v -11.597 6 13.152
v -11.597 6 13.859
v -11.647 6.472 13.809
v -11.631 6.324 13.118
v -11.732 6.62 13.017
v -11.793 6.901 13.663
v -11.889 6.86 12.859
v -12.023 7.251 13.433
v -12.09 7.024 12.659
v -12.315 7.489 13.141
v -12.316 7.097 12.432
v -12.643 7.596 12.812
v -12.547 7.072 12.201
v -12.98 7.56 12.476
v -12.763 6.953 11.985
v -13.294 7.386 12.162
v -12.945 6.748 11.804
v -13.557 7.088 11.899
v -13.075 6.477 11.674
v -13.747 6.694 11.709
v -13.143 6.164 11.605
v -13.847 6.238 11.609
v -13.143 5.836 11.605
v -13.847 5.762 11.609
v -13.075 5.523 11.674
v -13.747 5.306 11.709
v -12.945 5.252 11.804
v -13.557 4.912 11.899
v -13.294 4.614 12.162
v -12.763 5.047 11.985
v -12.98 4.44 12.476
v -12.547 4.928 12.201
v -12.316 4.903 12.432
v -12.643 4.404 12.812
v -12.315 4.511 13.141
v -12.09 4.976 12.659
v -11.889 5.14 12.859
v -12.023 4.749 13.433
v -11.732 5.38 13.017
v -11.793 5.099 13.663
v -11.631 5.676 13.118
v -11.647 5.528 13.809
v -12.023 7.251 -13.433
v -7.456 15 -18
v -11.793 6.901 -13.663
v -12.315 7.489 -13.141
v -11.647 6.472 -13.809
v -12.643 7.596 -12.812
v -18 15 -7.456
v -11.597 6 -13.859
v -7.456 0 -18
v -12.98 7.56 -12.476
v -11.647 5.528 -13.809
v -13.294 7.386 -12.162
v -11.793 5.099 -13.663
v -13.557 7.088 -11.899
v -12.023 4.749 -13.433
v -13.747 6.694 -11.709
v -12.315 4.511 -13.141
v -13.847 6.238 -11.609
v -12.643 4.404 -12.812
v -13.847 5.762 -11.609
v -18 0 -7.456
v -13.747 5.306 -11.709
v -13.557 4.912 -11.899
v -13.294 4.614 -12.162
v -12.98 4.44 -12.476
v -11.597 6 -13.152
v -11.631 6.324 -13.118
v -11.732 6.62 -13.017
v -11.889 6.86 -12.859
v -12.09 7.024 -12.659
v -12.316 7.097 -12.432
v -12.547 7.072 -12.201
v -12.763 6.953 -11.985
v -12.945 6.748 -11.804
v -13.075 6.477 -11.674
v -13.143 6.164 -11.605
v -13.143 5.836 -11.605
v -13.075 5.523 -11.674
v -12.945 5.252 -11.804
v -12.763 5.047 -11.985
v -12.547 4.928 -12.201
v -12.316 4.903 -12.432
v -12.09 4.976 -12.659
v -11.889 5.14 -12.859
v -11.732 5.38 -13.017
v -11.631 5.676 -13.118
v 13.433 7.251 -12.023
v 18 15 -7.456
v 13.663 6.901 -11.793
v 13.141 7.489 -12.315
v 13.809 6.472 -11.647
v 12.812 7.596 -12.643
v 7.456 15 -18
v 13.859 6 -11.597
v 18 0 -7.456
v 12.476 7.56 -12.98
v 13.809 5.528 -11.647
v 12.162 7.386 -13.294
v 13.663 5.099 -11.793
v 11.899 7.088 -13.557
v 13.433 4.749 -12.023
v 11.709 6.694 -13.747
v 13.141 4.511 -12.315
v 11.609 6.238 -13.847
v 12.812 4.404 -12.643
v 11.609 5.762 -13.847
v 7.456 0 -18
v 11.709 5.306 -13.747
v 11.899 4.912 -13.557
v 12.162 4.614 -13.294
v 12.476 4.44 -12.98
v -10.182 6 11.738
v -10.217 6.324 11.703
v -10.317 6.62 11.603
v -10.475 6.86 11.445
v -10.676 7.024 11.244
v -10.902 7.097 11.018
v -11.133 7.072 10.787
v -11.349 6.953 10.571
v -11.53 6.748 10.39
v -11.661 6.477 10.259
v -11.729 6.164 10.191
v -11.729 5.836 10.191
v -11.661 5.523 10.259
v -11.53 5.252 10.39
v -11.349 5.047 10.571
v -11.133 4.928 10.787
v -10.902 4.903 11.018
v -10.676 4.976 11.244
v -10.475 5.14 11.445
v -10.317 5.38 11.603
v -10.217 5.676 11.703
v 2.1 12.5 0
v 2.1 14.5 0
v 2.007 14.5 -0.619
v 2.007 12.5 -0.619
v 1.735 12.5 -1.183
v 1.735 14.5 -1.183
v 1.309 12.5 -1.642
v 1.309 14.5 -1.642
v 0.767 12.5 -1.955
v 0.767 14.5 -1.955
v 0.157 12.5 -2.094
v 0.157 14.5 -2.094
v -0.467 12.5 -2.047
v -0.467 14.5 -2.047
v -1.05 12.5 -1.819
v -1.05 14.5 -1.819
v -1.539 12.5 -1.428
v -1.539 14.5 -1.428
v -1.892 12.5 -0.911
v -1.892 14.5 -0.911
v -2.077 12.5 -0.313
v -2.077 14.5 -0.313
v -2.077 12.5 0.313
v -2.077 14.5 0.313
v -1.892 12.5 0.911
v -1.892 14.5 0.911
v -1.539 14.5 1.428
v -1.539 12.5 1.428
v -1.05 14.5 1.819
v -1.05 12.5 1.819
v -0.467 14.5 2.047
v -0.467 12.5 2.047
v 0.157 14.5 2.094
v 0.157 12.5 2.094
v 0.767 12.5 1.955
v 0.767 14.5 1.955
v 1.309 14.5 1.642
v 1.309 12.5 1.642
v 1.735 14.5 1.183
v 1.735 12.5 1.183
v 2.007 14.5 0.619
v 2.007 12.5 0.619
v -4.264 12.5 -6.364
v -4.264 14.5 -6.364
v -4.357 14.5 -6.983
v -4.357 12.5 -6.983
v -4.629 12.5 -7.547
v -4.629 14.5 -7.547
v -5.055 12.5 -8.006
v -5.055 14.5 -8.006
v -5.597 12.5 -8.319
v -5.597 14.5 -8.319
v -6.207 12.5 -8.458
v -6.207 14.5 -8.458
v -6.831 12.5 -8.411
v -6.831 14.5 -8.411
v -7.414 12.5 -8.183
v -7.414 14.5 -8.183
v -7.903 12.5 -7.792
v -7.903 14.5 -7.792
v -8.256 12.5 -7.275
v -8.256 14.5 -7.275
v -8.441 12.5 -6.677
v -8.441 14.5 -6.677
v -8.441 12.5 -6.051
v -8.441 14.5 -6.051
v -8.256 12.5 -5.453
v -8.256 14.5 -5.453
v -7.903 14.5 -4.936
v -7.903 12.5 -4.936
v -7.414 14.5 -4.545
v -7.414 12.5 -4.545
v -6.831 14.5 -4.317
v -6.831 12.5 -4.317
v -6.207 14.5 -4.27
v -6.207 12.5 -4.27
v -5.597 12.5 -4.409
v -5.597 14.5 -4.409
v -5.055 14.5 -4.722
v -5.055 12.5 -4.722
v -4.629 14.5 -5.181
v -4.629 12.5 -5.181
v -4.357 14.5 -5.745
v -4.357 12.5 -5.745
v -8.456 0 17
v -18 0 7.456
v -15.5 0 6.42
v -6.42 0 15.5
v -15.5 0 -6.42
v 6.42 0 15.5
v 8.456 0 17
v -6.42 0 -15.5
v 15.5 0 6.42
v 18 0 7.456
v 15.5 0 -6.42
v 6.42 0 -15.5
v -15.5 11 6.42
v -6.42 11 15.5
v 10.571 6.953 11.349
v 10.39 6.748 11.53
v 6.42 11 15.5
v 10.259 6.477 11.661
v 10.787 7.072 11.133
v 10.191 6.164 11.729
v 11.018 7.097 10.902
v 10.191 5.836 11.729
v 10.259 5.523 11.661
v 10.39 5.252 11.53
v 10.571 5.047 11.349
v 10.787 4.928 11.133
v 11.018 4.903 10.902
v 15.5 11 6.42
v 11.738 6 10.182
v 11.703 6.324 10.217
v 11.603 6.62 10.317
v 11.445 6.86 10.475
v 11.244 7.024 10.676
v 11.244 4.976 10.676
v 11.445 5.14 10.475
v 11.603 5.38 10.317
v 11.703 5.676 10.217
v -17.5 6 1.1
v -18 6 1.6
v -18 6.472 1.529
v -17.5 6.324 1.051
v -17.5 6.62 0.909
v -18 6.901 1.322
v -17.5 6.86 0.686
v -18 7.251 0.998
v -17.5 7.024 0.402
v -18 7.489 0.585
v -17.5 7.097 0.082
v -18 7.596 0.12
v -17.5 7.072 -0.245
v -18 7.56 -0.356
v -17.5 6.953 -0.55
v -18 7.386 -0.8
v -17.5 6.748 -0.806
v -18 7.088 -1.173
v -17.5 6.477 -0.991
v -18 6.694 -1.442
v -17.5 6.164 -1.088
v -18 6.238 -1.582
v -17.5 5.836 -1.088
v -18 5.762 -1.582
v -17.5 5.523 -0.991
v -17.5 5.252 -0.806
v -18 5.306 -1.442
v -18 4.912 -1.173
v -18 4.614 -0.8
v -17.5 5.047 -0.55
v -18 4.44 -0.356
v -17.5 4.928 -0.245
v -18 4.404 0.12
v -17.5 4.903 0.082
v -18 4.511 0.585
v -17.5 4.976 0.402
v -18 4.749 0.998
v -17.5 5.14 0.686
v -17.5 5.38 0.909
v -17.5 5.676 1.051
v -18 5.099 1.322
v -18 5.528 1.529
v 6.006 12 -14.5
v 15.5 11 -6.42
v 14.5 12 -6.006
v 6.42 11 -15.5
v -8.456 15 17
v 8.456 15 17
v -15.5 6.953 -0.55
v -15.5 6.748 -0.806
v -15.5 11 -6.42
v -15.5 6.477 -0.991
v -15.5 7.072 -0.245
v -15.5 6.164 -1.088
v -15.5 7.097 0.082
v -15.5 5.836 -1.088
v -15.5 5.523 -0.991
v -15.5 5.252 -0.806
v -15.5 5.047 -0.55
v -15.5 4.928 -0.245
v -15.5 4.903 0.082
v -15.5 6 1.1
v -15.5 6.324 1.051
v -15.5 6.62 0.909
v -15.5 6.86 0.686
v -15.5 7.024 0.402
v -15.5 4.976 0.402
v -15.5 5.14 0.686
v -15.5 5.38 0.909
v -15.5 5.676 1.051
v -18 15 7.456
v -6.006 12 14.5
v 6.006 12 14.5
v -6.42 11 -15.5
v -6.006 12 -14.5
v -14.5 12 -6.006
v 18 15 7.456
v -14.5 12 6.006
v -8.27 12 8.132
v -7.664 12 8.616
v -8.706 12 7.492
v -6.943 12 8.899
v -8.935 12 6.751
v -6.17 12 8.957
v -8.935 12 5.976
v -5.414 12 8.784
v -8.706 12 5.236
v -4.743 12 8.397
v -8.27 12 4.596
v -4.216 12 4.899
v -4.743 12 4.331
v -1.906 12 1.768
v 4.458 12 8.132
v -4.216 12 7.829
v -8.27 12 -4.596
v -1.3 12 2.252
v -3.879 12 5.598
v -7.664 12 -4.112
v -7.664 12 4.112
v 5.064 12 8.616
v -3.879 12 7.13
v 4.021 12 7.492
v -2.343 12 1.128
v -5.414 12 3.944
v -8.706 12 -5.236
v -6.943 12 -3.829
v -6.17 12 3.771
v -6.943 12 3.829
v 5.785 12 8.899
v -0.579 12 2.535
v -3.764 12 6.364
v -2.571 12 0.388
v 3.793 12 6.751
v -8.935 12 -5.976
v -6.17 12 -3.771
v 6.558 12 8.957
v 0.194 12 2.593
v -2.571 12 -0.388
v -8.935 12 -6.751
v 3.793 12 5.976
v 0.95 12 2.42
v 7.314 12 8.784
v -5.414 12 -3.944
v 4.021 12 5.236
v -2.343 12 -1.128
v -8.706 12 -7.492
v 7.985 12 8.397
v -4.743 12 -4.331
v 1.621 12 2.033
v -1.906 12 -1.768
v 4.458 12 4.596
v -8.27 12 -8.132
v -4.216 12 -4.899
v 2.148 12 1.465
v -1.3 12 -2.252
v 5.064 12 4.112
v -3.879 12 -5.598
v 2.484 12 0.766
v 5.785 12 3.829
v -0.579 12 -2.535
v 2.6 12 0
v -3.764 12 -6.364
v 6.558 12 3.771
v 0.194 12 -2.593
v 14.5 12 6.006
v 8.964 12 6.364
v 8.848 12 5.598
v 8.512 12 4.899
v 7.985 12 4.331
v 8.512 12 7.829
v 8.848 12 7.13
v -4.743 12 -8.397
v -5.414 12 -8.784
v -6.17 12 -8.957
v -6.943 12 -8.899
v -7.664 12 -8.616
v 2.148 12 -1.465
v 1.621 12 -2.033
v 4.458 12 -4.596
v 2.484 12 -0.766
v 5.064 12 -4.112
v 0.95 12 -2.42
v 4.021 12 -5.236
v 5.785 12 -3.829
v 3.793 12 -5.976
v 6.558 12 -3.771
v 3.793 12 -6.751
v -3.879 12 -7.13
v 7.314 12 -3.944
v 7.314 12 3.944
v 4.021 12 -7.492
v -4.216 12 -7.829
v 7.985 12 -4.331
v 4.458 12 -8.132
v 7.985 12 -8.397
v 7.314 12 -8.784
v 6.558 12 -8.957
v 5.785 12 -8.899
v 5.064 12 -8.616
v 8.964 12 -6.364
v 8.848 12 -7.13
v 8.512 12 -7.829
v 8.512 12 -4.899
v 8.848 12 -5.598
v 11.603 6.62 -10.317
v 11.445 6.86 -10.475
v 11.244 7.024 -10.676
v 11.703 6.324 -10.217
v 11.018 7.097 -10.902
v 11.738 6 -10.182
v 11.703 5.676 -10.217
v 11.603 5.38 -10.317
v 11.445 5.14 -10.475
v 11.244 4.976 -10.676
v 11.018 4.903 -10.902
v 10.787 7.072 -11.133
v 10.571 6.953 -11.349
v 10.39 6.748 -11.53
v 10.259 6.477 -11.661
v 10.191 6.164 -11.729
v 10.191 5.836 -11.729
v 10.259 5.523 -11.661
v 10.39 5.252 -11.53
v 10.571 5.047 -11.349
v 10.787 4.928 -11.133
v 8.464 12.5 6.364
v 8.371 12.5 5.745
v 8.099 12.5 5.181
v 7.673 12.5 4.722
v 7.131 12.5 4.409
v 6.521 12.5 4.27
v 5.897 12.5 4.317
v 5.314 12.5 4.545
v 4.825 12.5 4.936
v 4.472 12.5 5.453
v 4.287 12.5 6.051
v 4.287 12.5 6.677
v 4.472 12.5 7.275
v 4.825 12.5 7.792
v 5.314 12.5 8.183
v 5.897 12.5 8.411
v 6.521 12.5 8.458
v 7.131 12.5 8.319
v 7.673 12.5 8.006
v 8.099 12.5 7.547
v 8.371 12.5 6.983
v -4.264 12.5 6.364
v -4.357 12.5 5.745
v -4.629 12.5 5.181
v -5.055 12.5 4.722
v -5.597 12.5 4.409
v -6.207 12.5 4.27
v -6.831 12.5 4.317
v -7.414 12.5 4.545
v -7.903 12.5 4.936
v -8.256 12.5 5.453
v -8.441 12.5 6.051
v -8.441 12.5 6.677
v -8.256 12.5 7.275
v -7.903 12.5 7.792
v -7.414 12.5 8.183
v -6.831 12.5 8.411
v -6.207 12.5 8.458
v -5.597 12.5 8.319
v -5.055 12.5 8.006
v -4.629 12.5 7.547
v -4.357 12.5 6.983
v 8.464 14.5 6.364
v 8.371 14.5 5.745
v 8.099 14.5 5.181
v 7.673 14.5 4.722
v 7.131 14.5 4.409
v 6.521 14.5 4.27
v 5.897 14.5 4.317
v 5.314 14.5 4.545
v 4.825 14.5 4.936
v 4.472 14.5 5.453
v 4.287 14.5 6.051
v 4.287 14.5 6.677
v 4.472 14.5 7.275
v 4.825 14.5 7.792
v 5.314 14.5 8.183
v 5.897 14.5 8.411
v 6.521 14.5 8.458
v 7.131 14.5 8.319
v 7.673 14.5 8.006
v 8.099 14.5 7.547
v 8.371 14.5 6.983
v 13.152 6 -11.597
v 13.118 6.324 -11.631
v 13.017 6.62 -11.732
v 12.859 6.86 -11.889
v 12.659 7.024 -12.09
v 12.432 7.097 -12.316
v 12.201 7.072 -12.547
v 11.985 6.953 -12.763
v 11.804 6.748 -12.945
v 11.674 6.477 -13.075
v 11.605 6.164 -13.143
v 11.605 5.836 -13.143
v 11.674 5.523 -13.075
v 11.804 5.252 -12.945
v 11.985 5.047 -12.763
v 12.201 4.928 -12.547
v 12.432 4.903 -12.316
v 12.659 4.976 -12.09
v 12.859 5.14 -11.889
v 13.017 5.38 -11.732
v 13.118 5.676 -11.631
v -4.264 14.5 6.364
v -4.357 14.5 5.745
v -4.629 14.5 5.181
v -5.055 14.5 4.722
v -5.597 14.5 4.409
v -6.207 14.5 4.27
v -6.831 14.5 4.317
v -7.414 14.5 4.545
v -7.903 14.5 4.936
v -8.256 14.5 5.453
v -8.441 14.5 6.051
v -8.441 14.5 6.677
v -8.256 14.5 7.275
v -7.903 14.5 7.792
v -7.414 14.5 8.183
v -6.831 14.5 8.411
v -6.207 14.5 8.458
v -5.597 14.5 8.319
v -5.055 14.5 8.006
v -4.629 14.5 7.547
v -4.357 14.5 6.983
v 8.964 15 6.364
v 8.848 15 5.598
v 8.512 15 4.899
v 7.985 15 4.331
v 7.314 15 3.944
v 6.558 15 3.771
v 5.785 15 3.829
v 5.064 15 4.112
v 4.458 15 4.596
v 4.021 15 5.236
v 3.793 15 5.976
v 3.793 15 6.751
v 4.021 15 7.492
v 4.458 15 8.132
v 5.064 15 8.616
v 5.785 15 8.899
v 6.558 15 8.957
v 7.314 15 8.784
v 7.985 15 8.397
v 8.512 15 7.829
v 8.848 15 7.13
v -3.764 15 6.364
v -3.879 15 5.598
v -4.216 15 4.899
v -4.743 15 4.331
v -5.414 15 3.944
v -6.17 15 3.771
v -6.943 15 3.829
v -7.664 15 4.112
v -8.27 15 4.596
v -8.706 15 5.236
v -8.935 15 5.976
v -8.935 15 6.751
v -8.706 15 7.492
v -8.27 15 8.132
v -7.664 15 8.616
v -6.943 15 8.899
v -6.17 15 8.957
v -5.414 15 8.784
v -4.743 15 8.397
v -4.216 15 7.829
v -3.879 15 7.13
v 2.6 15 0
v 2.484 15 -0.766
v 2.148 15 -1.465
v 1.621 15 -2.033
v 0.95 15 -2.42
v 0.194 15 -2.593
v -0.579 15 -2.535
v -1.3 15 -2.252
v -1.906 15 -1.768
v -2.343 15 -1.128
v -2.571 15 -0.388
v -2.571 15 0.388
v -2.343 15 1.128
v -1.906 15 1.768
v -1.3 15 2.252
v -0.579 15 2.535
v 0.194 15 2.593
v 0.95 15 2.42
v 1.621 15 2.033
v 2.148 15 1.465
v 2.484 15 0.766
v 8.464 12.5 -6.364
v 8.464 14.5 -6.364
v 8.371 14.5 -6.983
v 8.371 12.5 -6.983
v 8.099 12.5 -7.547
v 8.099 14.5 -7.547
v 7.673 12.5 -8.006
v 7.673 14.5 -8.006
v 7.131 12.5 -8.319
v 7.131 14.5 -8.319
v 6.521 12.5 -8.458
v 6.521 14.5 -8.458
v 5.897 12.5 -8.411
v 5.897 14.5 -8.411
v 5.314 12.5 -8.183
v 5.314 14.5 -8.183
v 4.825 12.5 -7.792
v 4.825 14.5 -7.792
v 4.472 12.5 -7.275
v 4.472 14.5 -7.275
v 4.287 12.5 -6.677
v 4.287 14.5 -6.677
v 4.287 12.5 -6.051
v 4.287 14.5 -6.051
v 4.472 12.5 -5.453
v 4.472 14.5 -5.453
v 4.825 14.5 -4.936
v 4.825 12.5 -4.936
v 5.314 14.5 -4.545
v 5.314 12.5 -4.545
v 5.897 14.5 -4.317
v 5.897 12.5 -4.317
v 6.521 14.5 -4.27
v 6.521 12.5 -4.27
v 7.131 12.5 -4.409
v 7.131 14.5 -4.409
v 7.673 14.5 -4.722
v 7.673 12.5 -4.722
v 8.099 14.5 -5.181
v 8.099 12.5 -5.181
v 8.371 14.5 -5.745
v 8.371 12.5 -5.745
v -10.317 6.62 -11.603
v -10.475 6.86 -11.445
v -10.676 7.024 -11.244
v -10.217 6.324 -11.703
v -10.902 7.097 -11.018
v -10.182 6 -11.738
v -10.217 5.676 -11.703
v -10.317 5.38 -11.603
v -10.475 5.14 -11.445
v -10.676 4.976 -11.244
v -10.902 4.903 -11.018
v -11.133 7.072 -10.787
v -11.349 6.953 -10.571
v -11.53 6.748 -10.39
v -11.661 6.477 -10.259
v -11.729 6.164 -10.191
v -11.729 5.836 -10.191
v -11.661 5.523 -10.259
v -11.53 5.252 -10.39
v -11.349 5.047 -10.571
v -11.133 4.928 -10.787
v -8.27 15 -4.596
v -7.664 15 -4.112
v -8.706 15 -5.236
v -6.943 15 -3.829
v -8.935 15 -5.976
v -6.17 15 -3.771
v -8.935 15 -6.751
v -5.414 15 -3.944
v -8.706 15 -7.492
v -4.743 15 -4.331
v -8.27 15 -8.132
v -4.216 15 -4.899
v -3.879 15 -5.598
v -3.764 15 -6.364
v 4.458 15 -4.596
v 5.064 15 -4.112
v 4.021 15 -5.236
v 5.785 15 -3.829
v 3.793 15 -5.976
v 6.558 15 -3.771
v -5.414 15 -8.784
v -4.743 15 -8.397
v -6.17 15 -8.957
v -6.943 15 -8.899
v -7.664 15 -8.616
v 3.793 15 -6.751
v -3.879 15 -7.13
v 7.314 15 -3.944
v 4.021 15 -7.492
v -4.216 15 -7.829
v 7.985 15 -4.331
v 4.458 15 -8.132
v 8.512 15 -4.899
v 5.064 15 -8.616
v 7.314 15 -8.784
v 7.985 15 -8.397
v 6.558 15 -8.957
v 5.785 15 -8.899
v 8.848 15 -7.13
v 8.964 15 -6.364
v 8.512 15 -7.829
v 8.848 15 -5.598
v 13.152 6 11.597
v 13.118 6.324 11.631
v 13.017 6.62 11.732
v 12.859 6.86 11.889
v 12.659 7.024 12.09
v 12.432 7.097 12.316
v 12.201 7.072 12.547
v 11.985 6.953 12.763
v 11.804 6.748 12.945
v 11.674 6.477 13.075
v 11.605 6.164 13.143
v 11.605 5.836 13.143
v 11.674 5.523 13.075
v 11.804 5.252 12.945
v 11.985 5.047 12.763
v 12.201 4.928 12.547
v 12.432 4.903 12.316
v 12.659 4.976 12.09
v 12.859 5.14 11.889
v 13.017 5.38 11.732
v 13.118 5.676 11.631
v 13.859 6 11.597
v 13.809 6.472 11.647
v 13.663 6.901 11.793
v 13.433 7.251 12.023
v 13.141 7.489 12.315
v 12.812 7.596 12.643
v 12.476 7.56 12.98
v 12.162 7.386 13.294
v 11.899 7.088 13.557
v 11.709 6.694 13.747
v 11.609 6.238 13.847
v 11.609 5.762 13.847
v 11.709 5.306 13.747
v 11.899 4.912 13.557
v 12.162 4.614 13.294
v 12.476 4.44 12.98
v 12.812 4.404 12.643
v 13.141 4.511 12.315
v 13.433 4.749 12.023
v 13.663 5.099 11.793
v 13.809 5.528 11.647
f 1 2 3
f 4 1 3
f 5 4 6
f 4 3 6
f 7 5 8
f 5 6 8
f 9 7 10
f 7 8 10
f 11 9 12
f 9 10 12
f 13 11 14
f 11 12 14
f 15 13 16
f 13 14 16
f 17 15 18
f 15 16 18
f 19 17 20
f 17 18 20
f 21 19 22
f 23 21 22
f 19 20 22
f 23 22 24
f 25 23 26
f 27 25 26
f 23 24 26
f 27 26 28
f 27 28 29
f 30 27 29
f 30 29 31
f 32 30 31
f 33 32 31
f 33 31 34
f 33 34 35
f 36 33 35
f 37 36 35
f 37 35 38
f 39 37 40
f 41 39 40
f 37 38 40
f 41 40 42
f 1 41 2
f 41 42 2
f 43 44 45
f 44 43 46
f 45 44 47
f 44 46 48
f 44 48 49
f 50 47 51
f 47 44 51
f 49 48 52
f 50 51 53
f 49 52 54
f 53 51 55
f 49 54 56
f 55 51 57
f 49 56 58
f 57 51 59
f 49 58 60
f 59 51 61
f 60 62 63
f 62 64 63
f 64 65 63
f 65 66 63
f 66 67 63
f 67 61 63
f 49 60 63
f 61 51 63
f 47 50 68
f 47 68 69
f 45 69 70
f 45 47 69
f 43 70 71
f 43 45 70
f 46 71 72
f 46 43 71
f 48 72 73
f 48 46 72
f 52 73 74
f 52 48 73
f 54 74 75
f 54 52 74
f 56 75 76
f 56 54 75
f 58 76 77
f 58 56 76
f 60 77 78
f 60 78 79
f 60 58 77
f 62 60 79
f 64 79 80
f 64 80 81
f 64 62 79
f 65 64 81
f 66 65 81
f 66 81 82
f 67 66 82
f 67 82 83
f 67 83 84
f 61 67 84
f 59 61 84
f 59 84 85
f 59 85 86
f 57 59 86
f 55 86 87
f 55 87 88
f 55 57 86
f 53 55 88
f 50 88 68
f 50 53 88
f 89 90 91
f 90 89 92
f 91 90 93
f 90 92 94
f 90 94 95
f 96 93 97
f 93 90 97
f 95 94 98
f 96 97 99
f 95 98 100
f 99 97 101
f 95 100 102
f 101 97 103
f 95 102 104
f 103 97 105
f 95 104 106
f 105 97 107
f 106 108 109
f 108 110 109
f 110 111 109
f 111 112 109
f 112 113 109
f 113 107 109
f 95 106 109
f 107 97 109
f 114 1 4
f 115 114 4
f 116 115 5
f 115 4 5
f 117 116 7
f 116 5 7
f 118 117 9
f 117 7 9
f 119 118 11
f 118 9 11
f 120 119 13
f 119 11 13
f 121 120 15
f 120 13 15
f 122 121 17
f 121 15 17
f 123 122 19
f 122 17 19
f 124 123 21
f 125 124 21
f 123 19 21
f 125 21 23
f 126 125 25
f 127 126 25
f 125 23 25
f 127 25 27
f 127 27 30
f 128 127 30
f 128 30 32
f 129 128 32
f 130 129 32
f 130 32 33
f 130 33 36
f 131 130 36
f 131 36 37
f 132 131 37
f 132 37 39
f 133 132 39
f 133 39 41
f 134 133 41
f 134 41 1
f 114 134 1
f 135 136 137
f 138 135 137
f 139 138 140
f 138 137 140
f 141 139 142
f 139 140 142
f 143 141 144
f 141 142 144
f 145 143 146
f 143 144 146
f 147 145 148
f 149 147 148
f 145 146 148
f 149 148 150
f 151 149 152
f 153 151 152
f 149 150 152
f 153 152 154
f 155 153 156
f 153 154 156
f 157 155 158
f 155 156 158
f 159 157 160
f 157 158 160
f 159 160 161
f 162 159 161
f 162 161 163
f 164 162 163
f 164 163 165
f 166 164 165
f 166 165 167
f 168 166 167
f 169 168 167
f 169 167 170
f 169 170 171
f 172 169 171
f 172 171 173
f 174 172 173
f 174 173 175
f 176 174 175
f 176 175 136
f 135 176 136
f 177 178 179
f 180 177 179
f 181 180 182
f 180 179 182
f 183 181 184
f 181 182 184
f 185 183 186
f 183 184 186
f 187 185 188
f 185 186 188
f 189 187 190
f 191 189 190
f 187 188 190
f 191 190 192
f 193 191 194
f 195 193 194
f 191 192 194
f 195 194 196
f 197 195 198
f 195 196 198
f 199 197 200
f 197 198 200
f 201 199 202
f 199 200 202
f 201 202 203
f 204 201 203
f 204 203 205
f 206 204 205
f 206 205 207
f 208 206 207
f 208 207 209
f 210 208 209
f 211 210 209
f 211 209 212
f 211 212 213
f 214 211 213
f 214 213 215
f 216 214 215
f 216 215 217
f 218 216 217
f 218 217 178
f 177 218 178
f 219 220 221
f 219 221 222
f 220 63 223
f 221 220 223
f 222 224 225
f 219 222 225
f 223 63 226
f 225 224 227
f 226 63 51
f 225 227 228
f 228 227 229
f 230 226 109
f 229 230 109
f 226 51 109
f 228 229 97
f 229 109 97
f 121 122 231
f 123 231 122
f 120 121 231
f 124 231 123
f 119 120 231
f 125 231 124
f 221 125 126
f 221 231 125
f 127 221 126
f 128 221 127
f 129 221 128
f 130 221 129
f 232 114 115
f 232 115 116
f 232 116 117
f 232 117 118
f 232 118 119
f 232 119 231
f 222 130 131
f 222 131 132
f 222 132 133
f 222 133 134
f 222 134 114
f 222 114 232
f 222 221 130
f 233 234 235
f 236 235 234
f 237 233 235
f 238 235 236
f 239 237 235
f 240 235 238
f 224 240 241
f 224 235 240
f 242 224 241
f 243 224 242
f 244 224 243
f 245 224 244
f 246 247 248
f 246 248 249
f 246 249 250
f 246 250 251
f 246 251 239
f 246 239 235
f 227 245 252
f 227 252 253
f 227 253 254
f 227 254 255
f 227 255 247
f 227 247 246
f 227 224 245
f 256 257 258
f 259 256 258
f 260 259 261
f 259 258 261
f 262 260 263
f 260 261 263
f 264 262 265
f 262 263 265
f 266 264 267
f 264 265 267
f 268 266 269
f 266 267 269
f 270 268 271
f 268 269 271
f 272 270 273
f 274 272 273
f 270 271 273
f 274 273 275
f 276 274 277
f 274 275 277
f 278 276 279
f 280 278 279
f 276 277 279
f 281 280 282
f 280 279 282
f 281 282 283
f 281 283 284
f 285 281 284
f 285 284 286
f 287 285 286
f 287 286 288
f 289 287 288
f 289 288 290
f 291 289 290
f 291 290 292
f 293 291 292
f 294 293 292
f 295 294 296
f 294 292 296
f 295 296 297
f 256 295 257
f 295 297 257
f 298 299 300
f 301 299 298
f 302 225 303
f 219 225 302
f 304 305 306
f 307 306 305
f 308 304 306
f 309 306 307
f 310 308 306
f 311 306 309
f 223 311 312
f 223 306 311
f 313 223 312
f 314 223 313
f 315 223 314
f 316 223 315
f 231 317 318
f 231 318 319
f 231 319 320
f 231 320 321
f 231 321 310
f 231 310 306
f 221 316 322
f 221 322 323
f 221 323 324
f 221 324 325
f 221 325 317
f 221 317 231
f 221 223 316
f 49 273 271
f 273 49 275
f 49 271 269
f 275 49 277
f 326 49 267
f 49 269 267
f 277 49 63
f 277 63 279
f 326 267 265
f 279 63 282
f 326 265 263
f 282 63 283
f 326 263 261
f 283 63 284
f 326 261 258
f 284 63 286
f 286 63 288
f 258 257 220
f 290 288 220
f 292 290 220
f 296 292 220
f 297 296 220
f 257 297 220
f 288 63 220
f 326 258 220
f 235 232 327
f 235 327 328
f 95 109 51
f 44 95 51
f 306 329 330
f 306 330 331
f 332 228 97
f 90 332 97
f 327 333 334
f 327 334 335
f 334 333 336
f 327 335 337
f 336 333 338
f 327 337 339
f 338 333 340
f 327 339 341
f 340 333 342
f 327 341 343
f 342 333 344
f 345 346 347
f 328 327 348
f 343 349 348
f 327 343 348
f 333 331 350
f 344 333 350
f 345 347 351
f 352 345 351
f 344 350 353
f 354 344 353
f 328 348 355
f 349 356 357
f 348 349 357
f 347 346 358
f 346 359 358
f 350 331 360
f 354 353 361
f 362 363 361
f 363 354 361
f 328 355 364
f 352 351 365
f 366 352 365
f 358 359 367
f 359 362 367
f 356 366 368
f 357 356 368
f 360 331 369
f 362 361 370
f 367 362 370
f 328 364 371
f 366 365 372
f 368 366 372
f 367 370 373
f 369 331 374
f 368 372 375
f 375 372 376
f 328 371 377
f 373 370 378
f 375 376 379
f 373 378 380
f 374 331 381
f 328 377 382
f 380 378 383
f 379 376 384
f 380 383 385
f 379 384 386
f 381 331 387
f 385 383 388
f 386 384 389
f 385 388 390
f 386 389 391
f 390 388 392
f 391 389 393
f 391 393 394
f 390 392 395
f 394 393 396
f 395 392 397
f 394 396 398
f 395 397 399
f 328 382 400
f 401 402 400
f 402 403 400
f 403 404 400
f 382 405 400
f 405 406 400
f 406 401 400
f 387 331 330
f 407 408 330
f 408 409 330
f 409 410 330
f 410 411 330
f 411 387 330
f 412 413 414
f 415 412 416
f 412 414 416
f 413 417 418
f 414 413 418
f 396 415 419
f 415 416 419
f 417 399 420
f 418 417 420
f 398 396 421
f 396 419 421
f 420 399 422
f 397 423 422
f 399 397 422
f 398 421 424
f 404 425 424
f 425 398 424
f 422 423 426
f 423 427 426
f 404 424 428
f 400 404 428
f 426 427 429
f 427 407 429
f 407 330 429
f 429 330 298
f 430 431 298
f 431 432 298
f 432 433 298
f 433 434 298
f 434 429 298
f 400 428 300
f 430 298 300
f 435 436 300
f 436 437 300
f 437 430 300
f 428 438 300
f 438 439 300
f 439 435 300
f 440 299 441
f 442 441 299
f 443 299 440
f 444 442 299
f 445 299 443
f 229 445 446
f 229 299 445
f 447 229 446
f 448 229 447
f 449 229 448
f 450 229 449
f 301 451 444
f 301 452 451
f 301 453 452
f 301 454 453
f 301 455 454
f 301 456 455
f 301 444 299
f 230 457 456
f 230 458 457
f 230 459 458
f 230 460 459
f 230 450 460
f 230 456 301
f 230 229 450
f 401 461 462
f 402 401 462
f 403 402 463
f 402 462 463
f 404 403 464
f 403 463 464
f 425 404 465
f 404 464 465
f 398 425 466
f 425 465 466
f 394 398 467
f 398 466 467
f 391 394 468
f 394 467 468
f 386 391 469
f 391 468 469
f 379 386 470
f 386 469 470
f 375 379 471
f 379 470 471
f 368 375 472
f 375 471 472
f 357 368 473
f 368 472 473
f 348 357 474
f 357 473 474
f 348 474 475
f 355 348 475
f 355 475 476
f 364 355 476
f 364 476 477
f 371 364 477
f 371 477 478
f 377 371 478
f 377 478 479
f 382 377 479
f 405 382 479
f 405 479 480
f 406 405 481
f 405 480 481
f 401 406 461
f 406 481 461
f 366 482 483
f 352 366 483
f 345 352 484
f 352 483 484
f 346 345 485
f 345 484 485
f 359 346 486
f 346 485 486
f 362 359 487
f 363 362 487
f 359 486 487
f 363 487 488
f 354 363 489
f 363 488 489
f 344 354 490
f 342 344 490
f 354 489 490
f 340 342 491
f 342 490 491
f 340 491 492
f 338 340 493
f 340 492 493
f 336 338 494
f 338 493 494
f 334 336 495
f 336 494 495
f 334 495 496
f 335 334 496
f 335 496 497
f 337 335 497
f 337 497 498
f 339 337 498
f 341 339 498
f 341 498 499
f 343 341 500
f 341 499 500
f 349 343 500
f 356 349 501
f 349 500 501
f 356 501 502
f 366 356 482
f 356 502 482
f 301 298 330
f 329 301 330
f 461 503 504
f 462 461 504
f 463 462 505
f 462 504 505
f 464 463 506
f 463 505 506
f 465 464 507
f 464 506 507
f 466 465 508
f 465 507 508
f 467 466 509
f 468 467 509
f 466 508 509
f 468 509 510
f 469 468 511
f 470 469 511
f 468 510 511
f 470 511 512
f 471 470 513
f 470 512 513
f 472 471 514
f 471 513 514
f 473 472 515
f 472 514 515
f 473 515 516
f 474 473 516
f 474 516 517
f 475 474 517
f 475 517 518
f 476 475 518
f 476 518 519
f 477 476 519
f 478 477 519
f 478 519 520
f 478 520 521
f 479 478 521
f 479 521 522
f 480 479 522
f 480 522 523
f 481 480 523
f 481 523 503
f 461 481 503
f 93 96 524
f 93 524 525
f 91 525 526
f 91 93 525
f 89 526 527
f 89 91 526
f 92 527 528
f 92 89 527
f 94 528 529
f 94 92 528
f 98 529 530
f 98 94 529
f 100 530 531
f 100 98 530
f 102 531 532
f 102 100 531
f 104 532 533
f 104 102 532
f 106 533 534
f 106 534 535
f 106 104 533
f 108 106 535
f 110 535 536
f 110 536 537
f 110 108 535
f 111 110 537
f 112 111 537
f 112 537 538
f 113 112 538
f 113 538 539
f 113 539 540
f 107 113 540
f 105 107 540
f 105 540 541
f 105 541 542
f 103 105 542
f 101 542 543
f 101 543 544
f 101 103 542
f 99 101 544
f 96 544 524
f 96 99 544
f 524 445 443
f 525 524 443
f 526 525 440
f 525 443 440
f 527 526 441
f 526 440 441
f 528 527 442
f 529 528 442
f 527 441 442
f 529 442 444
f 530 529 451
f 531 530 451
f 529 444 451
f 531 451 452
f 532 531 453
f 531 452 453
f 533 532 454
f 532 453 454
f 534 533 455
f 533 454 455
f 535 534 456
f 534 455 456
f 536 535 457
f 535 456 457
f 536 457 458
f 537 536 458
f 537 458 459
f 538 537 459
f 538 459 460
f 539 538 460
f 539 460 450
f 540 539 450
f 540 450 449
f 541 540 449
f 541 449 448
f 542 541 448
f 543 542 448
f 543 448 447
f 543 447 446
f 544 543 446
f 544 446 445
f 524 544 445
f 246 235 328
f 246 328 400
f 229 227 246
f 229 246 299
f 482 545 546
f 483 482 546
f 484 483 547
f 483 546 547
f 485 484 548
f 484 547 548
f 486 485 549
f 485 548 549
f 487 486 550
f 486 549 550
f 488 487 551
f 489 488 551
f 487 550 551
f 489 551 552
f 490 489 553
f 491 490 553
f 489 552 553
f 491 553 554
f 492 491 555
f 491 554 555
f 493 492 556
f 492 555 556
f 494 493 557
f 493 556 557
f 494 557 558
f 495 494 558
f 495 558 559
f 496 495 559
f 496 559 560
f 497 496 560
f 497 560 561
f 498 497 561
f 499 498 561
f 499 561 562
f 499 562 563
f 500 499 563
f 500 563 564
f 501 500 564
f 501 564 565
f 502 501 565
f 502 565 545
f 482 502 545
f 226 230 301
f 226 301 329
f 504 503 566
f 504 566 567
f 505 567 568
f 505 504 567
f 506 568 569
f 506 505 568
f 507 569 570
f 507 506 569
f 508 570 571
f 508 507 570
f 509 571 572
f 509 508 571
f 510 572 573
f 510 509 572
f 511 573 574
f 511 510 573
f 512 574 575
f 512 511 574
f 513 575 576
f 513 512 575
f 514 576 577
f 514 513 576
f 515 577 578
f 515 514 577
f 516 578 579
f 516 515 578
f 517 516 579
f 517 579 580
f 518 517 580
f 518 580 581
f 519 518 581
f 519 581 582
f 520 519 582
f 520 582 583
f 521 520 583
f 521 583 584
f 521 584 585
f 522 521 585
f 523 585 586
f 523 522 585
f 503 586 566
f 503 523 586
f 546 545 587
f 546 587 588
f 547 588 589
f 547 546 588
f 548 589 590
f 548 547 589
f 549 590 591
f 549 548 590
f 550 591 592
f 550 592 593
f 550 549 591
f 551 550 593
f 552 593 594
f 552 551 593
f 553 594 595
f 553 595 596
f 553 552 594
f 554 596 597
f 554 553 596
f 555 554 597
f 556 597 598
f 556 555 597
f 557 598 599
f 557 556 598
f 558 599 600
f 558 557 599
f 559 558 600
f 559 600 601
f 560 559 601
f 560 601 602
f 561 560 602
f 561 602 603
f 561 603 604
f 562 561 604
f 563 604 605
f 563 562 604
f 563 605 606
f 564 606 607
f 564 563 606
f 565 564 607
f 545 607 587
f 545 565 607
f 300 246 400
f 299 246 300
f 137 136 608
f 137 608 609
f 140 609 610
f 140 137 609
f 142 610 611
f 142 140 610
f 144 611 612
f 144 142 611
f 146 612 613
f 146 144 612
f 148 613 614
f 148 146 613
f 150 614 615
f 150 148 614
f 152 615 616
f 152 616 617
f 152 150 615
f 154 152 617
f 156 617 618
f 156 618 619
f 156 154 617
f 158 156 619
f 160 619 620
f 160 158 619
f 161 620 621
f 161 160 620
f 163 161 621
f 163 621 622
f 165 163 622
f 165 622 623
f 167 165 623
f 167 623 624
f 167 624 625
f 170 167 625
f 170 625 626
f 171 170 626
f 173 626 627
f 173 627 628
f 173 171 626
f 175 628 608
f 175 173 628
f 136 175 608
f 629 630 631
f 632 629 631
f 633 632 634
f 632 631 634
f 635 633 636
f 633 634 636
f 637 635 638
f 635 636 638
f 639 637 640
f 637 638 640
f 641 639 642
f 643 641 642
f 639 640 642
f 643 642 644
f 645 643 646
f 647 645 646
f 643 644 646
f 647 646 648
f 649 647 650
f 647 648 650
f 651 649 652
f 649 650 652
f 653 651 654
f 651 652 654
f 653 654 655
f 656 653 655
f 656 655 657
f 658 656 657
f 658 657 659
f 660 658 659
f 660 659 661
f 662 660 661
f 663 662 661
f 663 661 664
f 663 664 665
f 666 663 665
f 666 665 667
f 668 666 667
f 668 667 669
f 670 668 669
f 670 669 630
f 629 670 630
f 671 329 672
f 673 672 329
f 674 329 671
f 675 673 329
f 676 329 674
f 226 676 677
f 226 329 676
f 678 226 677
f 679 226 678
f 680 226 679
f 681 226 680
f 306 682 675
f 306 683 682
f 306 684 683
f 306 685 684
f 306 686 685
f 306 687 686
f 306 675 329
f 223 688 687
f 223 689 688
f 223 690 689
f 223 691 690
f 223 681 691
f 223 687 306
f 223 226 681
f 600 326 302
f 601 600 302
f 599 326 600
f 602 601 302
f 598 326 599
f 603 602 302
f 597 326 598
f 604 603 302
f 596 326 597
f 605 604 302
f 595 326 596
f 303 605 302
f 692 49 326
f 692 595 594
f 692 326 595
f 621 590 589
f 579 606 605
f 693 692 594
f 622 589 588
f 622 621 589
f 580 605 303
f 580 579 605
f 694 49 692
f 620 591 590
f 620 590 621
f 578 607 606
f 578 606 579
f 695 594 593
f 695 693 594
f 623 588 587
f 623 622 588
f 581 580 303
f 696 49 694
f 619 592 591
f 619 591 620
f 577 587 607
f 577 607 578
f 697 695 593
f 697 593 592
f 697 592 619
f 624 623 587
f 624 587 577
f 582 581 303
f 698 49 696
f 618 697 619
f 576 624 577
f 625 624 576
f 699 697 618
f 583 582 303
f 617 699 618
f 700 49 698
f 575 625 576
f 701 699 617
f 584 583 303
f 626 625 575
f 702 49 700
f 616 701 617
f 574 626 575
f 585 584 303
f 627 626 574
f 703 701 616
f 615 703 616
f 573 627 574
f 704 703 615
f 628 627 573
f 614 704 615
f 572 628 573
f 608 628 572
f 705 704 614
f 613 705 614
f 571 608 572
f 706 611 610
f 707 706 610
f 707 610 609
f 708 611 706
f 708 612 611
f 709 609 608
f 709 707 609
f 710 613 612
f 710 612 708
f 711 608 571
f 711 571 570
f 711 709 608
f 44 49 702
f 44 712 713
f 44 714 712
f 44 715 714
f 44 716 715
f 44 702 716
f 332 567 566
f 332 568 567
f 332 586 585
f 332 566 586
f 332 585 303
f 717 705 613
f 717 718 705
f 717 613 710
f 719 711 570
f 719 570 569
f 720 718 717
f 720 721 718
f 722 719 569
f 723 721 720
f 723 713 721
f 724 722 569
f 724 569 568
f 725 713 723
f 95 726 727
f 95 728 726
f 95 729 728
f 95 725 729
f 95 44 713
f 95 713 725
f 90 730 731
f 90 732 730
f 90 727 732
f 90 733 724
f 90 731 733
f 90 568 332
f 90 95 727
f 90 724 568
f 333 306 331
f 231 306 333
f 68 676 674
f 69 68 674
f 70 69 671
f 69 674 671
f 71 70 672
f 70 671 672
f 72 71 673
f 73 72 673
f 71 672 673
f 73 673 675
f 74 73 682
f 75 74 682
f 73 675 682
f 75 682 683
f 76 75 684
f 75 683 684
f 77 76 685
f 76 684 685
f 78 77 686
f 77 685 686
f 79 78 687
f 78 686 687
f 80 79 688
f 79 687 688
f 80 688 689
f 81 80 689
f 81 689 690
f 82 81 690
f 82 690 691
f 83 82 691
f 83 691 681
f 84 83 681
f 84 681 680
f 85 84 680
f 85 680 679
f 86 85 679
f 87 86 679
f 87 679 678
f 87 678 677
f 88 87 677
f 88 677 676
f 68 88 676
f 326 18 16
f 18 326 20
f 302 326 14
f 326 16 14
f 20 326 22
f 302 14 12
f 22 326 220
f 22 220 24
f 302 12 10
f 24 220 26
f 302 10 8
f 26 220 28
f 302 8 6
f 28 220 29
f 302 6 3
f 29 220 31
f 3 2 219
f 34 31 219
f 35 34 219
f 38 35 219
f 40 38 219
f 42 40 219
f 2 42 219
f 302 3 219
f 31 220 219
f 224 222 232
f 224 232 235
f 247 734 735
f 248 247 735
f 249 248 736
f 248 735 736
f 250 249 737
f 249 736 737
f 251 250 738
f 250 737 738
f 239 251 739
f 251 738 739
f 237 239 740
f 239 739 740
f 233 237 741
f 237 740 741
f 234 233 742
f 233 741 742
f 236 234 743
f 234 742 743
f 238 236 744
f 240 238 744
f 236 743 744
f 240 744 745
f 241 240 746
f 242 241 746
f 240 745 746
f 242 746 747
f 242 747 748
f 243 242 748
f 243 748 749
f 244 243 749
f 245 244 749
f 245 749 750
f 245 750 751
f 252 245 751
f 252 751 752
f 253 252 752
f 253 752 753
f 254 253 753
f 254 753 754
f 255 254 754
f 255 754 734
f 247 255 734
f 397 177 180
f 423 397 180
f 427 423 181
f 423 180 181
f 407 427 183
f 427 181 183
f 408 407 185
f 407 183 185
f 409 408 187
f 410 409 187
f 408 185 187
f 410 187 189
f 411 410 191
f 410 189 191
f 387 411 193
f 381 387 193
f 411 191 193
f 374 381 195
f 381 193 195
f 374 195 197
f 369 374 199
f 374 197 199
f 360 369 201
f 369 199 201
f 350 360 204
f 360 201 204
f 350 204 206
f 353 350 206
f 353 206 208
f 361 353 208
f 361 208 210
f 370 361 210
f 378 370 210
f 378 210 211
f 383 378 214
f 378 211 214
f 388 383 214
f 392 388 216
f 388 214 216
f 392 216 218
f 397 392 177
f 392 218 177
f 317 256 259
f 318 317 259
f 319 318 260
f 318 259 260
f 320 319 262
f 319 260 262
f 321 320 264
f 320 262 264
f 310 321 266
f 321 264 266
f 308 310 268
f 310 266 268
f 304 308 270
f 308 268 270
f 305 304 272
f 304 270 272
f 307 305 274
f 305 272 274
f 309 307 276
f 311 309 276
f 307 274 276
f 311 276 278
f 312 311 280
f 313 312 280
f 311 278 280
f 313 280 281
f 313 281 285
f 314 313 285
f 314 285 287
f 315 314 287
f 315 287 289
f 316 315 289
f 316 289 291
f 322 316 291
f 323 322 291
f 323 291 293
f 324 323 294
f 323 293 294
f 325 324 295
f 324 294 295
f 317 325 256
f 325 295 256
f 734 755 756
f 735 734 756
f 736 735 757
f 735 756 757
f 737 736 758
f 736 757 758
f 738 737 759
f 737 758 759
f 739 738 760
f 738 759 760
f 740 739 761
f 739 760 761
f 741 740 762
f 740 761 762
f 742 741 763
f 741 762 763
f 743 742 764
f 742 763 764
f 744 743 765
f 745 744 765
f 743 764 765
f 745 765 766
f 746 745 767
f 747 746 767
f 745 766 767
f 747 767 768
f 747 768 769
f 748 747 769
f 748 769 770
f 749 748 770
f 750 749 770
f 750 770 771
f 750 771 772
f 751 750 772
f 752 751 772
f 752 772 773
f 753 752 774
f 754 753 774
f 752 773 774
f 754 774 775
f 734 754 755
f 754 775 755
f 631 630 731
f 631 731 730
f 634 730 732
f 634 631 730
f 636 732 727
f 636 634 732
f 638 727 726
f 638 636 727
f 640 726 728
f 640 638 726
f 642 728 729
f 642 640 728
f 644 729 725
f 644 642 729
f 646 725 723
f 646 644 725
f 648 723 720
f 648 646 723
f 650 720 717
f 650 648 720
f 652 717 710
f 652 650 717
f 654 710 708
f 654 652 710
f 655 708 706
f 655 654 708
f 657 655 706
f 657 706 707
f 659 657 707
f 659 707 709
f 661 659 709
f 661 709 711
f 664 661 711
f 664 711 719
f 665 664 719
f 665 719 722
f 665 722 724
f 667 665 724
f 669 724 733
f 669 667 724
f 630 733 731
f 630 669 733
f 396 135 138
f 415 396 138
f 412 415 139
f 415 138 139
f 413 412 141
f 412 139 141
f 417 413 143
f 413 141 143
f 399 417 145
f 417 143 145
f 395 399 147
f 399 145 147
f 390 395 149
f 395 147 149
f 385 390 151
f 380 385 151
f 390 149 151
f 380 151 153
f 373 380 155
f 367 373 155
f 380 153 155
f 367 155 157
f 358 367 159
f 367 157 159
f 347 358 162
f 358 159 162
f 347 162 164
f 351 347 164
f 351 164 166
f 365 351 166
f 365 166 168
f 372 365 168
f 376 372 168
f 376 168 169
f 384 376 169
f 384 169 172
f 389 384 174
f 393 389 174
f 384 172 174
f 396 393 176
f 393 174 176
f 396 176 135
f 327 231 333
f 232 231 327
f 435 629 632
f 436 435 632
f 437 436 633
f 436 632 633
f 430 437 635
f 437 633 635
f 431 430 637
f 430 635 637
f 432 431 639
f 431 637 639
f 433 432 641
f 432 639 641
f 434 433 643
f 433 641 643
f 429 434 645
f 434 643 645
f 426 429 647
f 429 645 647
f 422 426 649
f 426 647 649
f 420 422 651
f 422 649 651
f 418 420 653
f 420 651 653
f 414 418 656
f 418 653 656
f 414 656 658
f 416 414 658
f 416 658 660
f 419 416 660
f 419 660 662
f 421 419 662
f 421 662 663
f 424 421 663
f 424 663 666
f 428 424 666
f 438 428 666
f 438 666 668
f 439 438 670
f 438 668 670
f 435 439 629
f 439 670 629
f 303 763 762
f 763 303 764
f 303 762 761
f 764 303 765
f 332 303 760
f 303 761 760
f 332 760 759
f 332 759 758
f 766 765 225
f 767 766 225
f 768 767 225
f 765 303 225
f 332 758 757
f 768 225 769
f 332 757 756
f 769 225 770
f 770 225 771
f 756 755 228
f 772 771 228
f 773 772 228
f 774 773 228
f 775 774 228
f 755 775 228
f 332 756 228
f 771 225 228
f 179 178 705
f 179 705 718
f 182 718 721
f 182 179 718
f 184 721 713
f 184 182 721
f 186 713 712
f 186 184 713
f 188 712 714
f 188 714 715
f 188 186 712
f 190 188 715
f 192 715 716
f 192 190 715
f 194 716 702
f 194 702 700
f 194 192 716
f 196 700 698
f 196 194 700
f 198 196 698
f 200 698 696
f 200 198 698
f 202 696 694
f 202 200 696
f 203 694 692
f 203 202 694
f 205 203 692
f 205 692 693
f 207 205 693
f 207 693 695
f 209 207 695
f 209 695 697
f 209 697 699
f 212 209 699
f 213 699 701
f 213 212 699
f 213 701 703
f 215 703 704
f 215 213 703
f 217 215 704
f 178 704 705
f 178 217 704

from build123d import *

# Parameters (mm, degrees)
EXTRUDE_1_DEPTH     = 12
EXTRUDE_2_DEPTH     = 3
CHAMFER_1_SIZE      = 1
SKETCH_3_R          = 2.1
CUT_EXTRUDE_1_DEPTH = 16
CHAMFER_3_SIZE      = 0.5
SKETCH_4_R          = 1.1
CUT_EXTRUDE_2_DEPTH = 44.455844123
SKETCH_5_R          = 1.1
CUT_EXTRUDE_3_DEPTH = 44.455844123
SKETCH_6_R          = 1.1
CUT_EXTRUDE_4_DEPTH = 2.5
CHAMFER_4_SIZE      = 0.5
CHAMFER_5_SIZE      = 0.5
CUT_EXTRUDE_5_DEPTH = 16


with BuildPart() as part:
    # Эскиз1 → Бобышка-Вытянуть1 (new body)
    with BuildSketch(Plane(origin=(0, 0, 0), x_dir=(1, 0, 0), z_dir=(0, 1, 0))):
        Polygon((-7.455844123, 18), (-18, 7.455844123), (-18, -7.455844123), (-7.455844123, -18), (7.455844123, -18), (18, -7.455844123), (18, 7.455844123), (7.455844123, 18), align=None)
        Polygon((-6.420310217, 15.5), (-15.5, 6.420310217), (-15.5, -6.420310217), (-6.420310217, -15.5), (6.420310217, -15.5), (15.5, -6.420310217), (15.5, 6.420310217), (6.420310217, 15.5), align=None, mode=Mode.SUBTRACT)
    extrude(amount=EXTRUDE_1_DEPTH)

    # Эскиз2 → Бобышка-Вытянуть2 (add)
    with BuildSketch(Plane(origin=(0, 12, 0), x_dir=(1, 0, 0), z_dir=(0, 1, 0))):
        Polygon((7.455844123, 18), (-7.455844123, 18), (-18, 7.455844123), (-18, -7.455844123), (-7.455844123, -18), (7.455844123, -18), (18, -7.455844123), (18, 7.455844123), align=None)
    extrude(amount=EXTRUDE_2_DEPTH)

    # Фаска1
    chamfer_1_edges = [part.edges().sort_by_distance(p)[0] for p in [
        (0, 12, -15.5),
        (-10.960155108, 12, -10.960155108),
        (-15.5, 12, 0),
        (-10.960155108, 12, 10.960155108),
        (0, 12, 15.5),
        (10.960155108, 12, 10.960155108),
        (15.5, 12, 0),
        (10.960155108, 12, -10.960155108),
    ]]
    chamfer(chamfer_1_edges, length=CHAMFER_1_SIZE)

    # Эскиз3 → Вырез-Вытянуть1 (cut, through all)
    with BuildSketch(Plane(origin=(0, 15, 0), x_dir=(1, 0, 0), z_dir=(0, 1, 0))):
        Circle(SKETCH_3_R)
        with Locations((-6.363961031, 6.363961031)):
            Circle(SKETCH_3_R)
        with Locations((6.363961031, 6.363961031)):
            Circle(SKETCH_3_R)
        with Locations((6.363961031, -6.363961031)):
            Circle(SKETCH_3_R)
        with Locations((-6.363961031, -6.363961031)):
            Circle(SKETCH_3_R)
    extrude(amount=-CUT_EXTRUDE_1_DEPTH, mode=Mode.SUBTRACT)

    # Фаска3
    chamfer_3_edges = [part.edges().sort_by_distance(p)[0] for p in [
        (-2.1, 12, 0),
        (-8.463961031, 12, -6.363961031),
        (4.263961031, 12, -6.363961031),
        (4.263961031, 12, 6.363961031),
        (-8.463961031, 12, 6.363961031),
    ]]
    chamfer(chamfer_3_edges, length=CHAMFER_3_SIZE)

    # Эскиз4 → Вырез-Вытянуть2 (cut, through all)
    with BuildSketch(Plane(origin=(-12.727922061, 0, 12.727922061), x_dir=(0.707106781, 0, 0.707106781), z_dir=(-0.707106781, 0, 0.707106781))):
        with Locations((0, 6)):
            Circle(SKETCH_4_R)
    extrude(amount=-CUT_EXTRUDE_2_DEPTH, mode=Mode.SUBTRACT)

    # Эскиз5 → Вырез-Вытянуть3 (cut, through all)
    with BuildSketch(Plane(origin=(12.727922061, 0, 12.727922061), x_dir=(0.707106781, 0, -0.707106781), z_dir=(0.707106781, 0, 0.707106781))):
        with Locations((0, 6)):
            Circle(SKETCH_5_R)
    extrude(amount=-CUT_EXTRUDE_3_DEPTH, mode=Mode.SUBTRACT)

    # Эскиз6 → Вырез-Вытянуть4 (cut)
    with BuildSketch(Plane.ZY.offset(18)):
        with Locations((0, 6)):
            Circle(SKETCH_6_R)
    extrude(amount=-CUT_EXTRUDE_4_DEPTH, mode=Mode.SUBTRACT)

    # Фаска4
    chamfer_4_edges = [part.edges().sort_by_distance(p)[0] for p in [
        (11.950104602, 6, -13.505739521),
        (-13.505739521, 6, 11.950104602),
        (-13.505739521, 6, -11.950104602),
        (11.950104602, 6, 13.505739521),
        (-18, 6, -1.1),
    ]]
    chamfer(chamfer_4_edges, length=CHAMFER_4_SIZE)

    # Фаска5
    chamfer_5_edges = [part.edges().sort_by_distance(p)[0] for p in [
        (-2.1, 15, 0),
        (-8.463961031, 15, -6.363961031),
        (4.263961031, 15, -6.363961031),
        (4.263961031, 15, 6.363961031),
        (-8.463961031, 15, 6.363961031),
    ]]
    chamfer(chamfer_5_edges, length=CHAMFER_5_SIZE)

    # Эскиз9 → Вырез-Вытянуть5 (cut, through all)
    with BuildSketch(Plane.XZ):
        Polygon((-8.455844123, 17), (-7.455844123, 18), (7.455844123, 18), (8.455844123, 17), align=None)
    extrude(amount=-CUT_EXTRUDE_5_DEPTH, mode=Mode.SUBTRACT)


solid = part.part
